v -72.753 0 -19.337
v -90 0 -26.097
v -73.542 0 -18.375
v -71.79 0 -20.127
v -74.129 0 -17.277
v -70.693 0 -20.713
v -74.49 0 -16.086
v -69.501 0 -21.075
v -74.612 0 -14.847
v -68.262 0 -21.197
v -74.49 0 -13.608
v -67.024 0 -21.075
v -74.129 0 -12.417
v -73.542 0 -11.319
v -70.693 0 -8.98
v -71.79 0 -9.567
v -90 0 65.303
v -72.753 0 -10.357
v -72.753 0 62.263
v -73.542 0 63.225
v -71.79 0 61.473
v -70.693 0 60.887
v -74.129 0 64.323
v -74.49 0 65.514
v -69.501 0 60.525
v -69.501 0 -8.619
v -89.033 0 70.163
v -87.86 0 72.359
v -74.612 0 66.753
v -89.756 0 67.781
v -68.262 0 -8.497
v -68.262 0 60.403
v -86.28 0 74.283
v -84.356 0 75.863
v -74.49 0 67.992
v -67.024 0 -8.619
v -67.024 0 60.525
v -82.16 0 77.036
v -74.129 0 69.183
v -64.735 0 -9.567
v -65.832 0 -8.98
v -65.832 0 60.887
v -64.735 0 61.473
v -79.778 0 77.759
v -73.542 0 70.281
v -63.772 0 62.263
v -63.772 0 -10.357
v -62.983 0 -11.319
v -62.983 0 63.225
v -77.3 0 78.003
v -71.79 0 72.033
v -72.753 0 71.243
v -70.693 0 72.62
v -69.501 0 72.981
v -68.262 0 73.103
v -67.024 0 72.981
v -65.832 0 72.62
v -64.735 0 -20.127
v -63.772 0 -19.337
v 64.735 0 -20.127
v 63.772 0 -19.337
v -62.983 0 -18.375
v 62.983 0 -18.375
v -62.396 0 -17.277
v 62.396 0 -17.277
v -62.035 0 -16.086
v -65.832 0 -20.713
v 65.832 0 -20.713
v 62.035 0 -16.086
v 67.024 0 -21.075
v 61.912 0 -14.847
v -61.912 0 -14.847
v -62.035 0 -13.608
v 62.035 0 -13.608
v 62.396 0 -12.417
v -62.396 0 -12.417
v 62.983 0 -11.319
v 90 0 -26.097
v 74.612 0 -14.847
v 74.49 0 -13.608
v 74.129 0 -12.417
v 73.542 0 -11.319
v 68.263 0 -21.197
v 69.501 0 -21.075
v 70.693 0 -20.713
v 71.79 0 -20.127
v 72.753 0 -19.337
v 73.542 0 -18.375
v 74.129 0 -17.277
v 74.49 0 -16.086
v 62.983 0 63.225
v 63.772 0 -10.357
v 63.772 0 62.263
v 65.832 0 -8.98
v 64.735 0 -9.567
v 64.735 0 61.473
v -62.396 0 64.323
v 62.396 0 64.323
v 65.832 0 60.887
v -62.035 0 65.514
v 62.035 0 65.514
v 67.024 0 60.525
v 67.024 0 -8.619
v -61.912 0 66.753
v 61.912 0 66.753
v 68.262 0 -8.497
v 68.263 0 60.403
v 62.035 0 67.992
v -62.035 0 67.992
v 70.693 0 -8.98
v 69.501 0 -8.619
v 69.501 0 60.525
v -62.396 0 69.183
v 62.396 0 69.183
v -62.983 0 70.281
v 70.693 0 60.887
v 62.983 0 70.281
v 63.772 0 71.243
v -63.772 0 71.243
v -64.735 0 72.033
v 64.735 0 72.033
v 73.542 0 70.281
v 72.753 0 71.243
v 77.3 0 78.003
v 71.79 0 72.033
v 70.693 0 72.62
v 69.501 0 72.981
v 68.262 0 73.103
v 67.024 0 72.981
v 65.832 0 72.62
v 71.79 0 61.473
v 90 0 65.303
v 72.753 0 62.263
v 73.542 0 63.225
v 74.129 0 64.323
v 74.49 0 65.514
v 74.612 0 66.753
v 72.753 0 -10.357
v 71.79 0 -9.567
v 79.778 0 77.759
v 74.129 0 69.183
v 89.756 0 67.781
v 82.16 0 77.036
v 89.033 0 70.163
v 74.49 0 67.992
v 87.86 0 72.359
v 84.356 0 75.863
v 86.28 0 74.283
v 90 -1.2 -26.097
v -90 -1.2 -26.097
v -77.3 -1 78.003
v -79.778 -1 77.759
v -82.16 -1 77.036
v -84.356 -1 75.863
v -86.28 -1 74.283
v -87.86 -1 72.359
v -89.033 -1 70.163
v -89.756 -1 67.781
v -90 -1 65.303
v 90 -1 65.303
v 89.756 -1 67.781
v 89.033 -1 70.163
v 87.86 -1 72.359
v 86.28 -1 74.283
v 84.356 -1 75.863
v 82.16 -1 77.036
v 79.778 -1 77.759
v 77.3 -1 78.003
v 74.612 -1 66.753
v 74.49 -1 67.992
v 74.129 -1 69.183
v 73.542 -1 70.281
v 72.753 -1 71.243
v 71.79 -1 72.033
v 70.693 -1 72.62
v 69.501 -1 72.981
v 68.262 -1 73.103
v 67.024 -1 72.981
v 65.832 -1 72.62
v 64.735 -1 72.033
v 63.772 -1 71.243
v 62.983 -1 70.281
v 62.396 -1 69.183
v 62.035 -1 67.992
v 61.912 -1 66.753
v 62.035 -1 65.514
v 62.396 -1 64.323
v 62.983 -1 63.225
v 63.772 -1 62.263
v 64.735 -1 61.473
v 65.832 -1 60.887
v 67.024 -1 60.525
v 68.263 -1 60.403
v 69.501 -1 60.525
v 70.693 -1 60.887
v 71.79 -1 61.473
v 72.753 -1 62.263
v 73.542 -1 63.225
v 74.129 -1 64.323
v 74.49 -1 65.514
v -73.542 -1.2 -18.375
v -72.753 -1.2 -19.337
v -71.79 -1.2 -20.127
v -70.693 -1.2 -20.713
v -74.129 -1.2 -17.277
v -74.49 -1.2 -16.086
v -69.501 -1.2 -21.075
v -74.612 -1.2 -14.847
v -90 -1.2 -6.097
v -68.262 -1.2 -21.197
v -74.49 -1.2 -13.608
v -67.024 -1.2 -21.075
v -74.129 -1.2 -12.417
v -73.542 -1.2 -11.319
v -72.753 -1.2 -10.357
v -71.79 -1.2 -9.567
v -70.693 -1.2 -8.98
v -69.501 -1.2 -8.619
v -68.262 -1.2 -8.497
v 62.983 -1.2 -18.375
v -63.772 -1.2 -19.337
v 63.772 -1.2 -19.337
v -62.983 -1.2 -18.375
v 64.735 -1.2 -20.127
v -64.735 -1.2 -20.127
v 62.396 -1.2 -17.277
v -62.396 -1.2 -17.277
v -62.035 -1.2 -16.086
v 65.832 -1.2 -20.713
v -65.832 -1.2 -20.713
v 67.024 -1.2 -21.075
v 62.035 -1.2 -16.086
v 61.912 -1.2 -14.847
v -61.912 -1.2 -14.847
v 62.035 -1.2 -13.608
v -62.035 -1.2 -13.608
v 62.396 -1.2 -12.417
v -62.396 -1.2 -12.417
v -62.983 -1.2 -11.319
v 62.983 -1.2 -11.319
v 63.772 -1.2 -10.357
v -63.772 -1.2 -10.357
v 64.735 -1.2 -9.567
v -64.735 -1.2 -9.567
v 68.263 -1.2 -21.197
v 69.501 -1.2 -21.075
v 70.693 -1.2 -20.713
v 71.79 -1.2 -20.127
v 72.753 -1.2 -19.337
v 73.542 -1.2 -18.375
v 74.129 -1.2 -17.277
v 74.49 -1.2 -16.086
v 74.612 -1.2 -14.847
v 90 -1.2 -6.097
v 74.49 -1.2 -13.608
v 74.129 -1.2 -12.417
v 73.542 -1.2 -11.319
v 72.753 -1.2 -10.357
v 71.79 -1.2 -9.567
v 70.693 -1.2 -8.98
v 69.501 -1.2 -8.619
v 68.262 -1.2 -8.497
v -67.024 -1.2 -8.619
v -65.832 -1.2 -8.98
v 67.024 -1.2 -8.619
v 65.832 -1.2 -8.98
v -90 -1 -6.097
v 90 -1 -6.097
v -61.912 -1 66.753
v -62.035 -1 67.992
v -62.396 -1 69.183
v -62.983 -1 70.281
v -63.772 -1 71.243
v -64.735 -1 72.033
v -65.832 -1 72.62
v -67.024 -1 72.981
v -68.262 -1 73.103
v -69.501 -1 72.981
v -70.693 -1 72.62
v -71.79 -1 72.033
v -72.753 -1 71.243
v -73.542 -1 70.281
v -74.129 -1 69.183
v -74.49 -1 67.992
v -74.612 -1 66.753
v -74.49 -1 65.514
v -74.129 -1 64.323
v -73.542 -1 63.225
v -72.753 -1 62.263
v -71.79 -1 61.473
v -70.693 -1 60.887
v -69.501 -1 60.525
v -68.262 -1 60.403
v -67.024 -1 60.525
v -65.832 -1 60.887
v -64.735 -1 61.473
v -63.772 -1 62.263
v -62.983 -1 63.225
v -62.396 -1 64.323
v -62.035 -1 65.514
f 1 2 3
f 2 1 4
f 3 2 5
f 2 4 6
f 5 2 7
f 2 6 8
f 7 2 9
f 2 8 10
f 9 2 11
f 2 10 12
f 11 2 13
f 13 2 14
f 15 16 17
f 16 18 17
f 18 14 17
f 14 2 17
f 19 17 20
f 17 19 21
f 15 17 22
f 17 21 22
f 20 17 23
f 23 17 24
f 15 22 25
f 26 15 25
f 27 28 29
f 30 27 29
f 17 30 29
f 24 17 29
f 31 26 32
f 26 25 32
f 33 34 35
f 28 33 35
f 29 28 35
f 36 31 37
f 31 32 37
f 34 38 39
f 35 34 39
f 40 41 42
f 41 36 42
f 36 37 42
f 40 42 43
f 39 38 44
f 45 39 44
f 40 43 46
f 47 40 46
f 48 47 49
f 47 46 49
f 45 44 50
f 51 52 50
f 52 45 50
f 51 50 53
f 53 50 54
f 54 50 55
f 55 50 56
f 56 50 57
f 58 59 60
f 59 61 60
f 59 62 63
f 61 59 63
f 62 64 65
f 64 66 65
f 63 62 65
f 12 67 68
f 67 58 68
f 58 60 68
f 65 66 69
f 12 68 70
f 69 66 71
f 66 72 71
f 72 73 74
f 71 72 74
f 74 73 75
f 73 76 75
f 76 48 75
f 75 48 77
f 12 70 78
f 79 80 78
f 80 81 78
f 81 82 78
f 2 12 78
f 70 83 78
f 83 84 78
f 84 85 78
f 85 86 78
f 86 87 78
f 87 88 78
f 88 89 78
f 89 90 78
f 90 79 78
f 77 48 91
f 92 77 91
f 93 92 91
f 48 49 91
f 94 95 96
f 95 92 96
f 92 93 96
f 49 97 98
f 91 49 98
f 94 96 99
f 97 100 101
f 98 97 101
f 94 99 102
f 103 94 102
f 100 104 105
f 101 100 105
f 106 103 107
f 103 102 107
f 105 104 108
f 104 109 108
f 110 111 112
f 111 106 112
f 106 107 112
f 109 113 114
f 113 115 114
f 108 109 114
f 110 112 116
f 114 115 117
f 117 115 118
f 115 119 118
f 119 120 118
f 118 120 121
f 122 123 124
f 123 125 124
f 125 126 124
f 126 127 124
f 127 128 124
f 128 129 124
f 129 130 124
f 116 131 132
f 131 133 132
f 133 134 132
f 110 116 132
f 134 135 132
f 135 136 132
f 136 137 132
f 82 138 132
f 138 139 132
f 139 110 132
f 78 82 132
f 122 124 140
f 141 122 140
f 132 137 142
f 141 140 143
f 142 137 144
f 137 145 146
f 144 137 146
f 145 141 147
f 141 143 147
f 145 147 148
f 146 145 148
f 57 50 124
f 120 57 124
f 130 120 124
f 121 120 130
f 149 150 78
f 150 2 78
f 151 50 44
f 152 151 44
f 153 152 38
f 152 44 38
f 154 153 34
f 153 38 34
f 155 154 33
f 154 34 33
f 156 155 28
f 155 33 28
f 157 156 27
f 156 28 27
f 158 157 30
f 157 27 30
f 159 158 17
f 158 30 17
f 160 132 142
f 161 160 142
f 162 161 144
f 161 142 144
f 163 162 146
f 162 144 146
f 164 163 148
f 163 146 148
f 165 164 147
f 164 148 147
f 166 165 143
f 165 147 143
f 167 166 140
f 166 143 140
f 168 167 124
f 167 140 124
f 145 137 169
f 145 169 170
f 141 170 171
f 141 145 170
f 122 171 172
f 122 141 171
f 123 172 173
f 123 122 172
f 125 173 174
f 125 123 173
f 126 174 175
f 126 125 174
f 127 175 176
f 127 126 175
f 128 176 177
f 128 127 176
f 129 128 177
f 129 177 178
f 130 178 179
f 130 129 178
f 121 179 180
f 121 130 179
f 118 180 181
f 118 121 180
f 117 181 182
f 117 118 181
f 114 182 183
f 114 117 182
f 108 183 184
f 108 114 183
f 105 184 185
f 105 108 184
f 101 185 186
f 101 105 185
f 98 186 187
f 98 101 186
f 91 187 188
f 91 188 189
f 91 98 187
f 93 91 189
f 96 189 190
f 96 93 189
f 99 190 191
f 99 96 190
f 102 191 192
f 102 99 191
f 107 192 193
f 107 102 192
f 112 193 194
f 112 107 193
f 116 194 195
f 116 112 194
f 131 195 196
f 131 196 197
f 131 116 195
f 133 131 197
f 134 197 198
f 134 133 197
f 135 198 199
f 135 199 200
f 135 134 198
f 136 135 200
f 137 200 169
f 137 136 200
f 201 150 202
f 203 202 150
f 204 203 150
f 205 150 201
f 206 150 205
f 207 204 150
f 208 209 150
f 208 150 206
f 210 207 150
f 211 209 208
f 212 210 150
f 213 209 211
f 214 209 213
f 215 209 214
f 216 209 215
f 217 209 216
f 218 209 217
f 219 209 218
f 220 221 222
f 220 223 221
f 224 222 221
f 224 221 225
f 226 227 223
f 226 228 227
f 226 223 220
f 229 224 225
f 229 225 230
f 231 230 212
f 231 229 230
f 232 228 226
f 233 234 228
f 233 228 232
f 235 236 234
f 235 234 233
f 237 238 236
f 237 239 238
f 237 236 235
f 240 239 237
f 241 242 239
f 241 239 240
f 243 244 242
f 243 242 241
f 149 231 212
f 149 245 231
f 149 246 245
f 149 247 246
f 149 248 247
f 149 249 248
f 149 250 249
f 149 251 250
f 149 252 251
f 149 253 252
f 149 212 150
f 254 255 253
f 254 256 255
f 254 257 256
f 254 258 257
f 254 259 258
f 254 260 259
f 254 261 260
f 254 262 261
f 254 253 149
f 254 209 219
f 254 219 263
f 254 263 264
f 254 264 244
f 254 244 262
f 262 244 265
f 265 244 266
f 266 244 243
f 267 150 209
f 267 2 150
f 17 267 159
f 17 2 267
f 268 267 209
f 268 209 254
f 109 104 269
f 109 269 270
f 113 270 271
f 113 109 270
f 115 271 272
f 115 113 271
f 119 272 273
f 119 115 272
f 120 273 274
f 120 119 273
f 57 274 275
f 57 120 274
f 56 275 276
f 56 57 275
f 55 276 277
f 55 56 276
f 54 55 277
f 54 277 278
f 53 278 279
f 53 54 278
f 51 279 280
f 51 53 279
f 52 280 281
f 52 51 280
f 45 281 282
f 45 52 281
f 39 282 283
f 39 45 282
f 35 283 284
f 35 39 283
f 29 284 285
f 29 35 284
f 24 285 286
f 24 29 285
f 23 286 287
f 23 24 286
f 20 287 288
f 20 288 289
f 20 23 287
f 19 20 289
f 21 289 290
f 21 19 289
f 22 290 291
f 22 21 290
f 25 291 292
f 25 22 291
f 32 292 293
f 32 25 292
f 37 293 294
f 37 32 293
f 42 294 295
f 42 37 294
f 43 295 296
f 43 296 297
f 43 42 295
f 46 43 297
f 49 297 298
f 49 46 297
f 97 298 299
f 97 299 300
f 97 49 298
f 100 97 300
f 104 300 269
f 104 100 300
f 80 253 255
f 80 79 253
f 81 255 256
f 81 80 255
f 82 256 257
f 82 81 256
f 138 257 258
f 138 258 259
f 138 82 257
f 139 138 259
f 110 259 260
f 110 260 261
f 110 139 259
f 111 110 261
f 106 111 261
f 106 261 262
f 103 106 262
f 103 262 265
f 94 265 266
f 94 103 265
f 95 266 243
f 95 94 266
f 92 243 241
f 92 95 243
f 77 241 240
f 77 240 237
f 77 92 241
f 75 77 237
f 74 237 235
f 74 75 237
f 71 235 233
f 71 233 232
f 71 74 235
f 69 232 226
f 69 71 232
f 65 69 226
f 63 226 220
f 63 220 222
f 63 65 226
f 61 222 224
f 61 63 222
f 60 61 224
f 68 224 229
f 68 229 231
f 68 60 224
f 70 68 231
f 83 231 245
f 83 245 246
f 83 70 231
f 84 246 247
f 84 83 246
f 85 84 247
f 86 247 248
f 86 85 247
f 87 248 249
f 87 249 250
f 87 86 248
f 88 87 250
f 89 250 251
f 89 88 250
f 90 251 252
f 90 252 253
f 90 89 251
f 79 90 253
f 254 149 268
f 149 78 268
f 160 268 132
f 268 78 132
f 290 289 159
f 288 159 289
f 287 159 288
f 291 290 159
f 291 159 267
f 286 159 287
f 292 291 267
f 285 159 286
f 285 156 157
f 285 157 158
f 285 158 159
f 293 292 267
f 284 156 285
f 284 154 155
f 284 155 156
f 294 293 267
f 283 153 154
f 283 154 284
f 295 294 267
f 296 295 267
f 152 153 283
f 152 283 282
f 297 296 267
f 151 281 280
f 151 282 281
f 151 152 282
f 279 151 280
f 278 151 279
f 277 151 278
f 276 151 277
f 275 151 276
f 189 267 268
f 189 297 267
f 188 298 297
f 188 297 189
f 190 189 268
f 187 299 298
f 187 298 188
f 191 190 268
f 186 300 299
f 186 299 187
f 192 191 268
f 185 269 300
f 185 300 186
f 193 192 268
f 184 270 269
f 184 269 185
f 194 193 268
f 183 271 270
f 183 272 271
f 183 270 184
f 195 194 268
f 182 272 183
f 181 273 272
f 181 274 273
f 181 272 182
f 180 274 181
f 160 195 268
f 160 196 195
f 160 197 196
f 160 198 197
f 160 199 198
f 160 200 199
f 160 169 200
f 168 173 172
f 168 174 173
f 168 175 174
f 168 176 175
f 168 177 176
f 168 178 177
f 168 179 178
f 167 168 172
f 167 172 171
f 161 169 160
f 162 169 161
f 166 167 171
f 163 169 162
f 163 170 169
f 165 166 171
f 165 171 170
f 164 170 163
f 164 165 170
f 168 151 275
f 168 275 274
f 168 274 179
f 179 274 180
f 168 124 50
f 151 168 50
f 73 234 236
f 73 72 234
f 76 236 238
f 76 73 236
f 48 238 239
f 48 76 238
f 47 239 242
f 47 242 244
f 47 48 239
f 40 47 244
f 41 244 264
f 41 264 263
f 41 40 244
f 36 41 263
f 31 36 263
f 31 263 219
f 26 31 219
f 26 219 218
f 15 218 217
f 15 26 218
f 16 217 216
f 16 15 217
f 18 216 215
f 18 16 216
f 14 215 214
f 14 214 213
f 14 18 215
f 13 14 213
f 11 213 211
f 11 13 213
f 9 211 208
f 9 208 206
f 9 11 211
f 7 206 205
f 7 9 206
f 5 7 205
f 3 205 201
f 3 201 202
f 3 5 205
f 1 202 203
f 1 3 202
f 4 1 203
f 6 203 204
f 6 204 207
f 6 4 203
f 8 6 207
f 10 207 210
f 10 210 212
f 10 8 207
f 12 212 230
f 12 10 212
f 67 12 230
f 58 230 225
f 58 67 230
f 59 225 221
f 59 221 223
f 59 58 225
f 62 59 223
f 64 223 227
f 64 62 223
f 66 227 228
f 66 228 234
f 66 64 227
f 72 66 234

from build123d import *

# Parameters (mm, degrees)
F0_R     = 6.35
F1_DEPTH = 1
F2_W     = 180
F2_H     = 20
F2_R     = 6.35
F3_DEPTH = 0.2


with BuildPart() as f1:
    # F0 (on Front) → F1 (new body)
    with BuildSketch(Plane.XZ):
        with BuildLine():
            Line((77.3, 78.003146), (-77.3, 78.003146))
            ThreePointArc((-77.3, 78.003146), (-86.280256, 74.283402), (-90, 65.303146))
            Line((-90, 65.303146), (-90, -26.096854))
            Line((-90, -26.096854), (90, -26.096854))
            Line((90, -26.096854), (90, 65.303146))
            ThreePointArc((90, 65.303146), (86.280256, 74.283402), (77.3, 78.003146))
        make_face()
        with Locations((-68.2625, -14.846854)):
            Circle(F0_R, mode=Mode.SUBTRACT)
        with Locations((68.2625, -14.846854)):
            Circle(F0_R, mode=Mode.SUBTRACT)
        with Locations((-68.2625, 66.753146)):
            Circle(F0_R, mode=Mode.SUBTRACT)
        with Locations((68.2625, 66.753146)):
            Circle(F0_R, mode=Mode.SUBTRACT)
    extrude(amount=F1_DEPTH)

    # F2 (on face) → F3 (join)
    with BuildSketch(Plane.XZ.offset(1)):
        with Locations((0, -16.096854)):
            Rectangle(F2_W, F2_H)
        with Locations((-68.2625, -14.846854)):
            Circle(F2_R, mode=Mode.SUBTRACT)
        with Locations((68.2625, -14.846854)):
            Circle(F2_R, mode=Mode.SUBTRACT)
    extrude(amount=F3_DEPTH)


solid = f1.part
